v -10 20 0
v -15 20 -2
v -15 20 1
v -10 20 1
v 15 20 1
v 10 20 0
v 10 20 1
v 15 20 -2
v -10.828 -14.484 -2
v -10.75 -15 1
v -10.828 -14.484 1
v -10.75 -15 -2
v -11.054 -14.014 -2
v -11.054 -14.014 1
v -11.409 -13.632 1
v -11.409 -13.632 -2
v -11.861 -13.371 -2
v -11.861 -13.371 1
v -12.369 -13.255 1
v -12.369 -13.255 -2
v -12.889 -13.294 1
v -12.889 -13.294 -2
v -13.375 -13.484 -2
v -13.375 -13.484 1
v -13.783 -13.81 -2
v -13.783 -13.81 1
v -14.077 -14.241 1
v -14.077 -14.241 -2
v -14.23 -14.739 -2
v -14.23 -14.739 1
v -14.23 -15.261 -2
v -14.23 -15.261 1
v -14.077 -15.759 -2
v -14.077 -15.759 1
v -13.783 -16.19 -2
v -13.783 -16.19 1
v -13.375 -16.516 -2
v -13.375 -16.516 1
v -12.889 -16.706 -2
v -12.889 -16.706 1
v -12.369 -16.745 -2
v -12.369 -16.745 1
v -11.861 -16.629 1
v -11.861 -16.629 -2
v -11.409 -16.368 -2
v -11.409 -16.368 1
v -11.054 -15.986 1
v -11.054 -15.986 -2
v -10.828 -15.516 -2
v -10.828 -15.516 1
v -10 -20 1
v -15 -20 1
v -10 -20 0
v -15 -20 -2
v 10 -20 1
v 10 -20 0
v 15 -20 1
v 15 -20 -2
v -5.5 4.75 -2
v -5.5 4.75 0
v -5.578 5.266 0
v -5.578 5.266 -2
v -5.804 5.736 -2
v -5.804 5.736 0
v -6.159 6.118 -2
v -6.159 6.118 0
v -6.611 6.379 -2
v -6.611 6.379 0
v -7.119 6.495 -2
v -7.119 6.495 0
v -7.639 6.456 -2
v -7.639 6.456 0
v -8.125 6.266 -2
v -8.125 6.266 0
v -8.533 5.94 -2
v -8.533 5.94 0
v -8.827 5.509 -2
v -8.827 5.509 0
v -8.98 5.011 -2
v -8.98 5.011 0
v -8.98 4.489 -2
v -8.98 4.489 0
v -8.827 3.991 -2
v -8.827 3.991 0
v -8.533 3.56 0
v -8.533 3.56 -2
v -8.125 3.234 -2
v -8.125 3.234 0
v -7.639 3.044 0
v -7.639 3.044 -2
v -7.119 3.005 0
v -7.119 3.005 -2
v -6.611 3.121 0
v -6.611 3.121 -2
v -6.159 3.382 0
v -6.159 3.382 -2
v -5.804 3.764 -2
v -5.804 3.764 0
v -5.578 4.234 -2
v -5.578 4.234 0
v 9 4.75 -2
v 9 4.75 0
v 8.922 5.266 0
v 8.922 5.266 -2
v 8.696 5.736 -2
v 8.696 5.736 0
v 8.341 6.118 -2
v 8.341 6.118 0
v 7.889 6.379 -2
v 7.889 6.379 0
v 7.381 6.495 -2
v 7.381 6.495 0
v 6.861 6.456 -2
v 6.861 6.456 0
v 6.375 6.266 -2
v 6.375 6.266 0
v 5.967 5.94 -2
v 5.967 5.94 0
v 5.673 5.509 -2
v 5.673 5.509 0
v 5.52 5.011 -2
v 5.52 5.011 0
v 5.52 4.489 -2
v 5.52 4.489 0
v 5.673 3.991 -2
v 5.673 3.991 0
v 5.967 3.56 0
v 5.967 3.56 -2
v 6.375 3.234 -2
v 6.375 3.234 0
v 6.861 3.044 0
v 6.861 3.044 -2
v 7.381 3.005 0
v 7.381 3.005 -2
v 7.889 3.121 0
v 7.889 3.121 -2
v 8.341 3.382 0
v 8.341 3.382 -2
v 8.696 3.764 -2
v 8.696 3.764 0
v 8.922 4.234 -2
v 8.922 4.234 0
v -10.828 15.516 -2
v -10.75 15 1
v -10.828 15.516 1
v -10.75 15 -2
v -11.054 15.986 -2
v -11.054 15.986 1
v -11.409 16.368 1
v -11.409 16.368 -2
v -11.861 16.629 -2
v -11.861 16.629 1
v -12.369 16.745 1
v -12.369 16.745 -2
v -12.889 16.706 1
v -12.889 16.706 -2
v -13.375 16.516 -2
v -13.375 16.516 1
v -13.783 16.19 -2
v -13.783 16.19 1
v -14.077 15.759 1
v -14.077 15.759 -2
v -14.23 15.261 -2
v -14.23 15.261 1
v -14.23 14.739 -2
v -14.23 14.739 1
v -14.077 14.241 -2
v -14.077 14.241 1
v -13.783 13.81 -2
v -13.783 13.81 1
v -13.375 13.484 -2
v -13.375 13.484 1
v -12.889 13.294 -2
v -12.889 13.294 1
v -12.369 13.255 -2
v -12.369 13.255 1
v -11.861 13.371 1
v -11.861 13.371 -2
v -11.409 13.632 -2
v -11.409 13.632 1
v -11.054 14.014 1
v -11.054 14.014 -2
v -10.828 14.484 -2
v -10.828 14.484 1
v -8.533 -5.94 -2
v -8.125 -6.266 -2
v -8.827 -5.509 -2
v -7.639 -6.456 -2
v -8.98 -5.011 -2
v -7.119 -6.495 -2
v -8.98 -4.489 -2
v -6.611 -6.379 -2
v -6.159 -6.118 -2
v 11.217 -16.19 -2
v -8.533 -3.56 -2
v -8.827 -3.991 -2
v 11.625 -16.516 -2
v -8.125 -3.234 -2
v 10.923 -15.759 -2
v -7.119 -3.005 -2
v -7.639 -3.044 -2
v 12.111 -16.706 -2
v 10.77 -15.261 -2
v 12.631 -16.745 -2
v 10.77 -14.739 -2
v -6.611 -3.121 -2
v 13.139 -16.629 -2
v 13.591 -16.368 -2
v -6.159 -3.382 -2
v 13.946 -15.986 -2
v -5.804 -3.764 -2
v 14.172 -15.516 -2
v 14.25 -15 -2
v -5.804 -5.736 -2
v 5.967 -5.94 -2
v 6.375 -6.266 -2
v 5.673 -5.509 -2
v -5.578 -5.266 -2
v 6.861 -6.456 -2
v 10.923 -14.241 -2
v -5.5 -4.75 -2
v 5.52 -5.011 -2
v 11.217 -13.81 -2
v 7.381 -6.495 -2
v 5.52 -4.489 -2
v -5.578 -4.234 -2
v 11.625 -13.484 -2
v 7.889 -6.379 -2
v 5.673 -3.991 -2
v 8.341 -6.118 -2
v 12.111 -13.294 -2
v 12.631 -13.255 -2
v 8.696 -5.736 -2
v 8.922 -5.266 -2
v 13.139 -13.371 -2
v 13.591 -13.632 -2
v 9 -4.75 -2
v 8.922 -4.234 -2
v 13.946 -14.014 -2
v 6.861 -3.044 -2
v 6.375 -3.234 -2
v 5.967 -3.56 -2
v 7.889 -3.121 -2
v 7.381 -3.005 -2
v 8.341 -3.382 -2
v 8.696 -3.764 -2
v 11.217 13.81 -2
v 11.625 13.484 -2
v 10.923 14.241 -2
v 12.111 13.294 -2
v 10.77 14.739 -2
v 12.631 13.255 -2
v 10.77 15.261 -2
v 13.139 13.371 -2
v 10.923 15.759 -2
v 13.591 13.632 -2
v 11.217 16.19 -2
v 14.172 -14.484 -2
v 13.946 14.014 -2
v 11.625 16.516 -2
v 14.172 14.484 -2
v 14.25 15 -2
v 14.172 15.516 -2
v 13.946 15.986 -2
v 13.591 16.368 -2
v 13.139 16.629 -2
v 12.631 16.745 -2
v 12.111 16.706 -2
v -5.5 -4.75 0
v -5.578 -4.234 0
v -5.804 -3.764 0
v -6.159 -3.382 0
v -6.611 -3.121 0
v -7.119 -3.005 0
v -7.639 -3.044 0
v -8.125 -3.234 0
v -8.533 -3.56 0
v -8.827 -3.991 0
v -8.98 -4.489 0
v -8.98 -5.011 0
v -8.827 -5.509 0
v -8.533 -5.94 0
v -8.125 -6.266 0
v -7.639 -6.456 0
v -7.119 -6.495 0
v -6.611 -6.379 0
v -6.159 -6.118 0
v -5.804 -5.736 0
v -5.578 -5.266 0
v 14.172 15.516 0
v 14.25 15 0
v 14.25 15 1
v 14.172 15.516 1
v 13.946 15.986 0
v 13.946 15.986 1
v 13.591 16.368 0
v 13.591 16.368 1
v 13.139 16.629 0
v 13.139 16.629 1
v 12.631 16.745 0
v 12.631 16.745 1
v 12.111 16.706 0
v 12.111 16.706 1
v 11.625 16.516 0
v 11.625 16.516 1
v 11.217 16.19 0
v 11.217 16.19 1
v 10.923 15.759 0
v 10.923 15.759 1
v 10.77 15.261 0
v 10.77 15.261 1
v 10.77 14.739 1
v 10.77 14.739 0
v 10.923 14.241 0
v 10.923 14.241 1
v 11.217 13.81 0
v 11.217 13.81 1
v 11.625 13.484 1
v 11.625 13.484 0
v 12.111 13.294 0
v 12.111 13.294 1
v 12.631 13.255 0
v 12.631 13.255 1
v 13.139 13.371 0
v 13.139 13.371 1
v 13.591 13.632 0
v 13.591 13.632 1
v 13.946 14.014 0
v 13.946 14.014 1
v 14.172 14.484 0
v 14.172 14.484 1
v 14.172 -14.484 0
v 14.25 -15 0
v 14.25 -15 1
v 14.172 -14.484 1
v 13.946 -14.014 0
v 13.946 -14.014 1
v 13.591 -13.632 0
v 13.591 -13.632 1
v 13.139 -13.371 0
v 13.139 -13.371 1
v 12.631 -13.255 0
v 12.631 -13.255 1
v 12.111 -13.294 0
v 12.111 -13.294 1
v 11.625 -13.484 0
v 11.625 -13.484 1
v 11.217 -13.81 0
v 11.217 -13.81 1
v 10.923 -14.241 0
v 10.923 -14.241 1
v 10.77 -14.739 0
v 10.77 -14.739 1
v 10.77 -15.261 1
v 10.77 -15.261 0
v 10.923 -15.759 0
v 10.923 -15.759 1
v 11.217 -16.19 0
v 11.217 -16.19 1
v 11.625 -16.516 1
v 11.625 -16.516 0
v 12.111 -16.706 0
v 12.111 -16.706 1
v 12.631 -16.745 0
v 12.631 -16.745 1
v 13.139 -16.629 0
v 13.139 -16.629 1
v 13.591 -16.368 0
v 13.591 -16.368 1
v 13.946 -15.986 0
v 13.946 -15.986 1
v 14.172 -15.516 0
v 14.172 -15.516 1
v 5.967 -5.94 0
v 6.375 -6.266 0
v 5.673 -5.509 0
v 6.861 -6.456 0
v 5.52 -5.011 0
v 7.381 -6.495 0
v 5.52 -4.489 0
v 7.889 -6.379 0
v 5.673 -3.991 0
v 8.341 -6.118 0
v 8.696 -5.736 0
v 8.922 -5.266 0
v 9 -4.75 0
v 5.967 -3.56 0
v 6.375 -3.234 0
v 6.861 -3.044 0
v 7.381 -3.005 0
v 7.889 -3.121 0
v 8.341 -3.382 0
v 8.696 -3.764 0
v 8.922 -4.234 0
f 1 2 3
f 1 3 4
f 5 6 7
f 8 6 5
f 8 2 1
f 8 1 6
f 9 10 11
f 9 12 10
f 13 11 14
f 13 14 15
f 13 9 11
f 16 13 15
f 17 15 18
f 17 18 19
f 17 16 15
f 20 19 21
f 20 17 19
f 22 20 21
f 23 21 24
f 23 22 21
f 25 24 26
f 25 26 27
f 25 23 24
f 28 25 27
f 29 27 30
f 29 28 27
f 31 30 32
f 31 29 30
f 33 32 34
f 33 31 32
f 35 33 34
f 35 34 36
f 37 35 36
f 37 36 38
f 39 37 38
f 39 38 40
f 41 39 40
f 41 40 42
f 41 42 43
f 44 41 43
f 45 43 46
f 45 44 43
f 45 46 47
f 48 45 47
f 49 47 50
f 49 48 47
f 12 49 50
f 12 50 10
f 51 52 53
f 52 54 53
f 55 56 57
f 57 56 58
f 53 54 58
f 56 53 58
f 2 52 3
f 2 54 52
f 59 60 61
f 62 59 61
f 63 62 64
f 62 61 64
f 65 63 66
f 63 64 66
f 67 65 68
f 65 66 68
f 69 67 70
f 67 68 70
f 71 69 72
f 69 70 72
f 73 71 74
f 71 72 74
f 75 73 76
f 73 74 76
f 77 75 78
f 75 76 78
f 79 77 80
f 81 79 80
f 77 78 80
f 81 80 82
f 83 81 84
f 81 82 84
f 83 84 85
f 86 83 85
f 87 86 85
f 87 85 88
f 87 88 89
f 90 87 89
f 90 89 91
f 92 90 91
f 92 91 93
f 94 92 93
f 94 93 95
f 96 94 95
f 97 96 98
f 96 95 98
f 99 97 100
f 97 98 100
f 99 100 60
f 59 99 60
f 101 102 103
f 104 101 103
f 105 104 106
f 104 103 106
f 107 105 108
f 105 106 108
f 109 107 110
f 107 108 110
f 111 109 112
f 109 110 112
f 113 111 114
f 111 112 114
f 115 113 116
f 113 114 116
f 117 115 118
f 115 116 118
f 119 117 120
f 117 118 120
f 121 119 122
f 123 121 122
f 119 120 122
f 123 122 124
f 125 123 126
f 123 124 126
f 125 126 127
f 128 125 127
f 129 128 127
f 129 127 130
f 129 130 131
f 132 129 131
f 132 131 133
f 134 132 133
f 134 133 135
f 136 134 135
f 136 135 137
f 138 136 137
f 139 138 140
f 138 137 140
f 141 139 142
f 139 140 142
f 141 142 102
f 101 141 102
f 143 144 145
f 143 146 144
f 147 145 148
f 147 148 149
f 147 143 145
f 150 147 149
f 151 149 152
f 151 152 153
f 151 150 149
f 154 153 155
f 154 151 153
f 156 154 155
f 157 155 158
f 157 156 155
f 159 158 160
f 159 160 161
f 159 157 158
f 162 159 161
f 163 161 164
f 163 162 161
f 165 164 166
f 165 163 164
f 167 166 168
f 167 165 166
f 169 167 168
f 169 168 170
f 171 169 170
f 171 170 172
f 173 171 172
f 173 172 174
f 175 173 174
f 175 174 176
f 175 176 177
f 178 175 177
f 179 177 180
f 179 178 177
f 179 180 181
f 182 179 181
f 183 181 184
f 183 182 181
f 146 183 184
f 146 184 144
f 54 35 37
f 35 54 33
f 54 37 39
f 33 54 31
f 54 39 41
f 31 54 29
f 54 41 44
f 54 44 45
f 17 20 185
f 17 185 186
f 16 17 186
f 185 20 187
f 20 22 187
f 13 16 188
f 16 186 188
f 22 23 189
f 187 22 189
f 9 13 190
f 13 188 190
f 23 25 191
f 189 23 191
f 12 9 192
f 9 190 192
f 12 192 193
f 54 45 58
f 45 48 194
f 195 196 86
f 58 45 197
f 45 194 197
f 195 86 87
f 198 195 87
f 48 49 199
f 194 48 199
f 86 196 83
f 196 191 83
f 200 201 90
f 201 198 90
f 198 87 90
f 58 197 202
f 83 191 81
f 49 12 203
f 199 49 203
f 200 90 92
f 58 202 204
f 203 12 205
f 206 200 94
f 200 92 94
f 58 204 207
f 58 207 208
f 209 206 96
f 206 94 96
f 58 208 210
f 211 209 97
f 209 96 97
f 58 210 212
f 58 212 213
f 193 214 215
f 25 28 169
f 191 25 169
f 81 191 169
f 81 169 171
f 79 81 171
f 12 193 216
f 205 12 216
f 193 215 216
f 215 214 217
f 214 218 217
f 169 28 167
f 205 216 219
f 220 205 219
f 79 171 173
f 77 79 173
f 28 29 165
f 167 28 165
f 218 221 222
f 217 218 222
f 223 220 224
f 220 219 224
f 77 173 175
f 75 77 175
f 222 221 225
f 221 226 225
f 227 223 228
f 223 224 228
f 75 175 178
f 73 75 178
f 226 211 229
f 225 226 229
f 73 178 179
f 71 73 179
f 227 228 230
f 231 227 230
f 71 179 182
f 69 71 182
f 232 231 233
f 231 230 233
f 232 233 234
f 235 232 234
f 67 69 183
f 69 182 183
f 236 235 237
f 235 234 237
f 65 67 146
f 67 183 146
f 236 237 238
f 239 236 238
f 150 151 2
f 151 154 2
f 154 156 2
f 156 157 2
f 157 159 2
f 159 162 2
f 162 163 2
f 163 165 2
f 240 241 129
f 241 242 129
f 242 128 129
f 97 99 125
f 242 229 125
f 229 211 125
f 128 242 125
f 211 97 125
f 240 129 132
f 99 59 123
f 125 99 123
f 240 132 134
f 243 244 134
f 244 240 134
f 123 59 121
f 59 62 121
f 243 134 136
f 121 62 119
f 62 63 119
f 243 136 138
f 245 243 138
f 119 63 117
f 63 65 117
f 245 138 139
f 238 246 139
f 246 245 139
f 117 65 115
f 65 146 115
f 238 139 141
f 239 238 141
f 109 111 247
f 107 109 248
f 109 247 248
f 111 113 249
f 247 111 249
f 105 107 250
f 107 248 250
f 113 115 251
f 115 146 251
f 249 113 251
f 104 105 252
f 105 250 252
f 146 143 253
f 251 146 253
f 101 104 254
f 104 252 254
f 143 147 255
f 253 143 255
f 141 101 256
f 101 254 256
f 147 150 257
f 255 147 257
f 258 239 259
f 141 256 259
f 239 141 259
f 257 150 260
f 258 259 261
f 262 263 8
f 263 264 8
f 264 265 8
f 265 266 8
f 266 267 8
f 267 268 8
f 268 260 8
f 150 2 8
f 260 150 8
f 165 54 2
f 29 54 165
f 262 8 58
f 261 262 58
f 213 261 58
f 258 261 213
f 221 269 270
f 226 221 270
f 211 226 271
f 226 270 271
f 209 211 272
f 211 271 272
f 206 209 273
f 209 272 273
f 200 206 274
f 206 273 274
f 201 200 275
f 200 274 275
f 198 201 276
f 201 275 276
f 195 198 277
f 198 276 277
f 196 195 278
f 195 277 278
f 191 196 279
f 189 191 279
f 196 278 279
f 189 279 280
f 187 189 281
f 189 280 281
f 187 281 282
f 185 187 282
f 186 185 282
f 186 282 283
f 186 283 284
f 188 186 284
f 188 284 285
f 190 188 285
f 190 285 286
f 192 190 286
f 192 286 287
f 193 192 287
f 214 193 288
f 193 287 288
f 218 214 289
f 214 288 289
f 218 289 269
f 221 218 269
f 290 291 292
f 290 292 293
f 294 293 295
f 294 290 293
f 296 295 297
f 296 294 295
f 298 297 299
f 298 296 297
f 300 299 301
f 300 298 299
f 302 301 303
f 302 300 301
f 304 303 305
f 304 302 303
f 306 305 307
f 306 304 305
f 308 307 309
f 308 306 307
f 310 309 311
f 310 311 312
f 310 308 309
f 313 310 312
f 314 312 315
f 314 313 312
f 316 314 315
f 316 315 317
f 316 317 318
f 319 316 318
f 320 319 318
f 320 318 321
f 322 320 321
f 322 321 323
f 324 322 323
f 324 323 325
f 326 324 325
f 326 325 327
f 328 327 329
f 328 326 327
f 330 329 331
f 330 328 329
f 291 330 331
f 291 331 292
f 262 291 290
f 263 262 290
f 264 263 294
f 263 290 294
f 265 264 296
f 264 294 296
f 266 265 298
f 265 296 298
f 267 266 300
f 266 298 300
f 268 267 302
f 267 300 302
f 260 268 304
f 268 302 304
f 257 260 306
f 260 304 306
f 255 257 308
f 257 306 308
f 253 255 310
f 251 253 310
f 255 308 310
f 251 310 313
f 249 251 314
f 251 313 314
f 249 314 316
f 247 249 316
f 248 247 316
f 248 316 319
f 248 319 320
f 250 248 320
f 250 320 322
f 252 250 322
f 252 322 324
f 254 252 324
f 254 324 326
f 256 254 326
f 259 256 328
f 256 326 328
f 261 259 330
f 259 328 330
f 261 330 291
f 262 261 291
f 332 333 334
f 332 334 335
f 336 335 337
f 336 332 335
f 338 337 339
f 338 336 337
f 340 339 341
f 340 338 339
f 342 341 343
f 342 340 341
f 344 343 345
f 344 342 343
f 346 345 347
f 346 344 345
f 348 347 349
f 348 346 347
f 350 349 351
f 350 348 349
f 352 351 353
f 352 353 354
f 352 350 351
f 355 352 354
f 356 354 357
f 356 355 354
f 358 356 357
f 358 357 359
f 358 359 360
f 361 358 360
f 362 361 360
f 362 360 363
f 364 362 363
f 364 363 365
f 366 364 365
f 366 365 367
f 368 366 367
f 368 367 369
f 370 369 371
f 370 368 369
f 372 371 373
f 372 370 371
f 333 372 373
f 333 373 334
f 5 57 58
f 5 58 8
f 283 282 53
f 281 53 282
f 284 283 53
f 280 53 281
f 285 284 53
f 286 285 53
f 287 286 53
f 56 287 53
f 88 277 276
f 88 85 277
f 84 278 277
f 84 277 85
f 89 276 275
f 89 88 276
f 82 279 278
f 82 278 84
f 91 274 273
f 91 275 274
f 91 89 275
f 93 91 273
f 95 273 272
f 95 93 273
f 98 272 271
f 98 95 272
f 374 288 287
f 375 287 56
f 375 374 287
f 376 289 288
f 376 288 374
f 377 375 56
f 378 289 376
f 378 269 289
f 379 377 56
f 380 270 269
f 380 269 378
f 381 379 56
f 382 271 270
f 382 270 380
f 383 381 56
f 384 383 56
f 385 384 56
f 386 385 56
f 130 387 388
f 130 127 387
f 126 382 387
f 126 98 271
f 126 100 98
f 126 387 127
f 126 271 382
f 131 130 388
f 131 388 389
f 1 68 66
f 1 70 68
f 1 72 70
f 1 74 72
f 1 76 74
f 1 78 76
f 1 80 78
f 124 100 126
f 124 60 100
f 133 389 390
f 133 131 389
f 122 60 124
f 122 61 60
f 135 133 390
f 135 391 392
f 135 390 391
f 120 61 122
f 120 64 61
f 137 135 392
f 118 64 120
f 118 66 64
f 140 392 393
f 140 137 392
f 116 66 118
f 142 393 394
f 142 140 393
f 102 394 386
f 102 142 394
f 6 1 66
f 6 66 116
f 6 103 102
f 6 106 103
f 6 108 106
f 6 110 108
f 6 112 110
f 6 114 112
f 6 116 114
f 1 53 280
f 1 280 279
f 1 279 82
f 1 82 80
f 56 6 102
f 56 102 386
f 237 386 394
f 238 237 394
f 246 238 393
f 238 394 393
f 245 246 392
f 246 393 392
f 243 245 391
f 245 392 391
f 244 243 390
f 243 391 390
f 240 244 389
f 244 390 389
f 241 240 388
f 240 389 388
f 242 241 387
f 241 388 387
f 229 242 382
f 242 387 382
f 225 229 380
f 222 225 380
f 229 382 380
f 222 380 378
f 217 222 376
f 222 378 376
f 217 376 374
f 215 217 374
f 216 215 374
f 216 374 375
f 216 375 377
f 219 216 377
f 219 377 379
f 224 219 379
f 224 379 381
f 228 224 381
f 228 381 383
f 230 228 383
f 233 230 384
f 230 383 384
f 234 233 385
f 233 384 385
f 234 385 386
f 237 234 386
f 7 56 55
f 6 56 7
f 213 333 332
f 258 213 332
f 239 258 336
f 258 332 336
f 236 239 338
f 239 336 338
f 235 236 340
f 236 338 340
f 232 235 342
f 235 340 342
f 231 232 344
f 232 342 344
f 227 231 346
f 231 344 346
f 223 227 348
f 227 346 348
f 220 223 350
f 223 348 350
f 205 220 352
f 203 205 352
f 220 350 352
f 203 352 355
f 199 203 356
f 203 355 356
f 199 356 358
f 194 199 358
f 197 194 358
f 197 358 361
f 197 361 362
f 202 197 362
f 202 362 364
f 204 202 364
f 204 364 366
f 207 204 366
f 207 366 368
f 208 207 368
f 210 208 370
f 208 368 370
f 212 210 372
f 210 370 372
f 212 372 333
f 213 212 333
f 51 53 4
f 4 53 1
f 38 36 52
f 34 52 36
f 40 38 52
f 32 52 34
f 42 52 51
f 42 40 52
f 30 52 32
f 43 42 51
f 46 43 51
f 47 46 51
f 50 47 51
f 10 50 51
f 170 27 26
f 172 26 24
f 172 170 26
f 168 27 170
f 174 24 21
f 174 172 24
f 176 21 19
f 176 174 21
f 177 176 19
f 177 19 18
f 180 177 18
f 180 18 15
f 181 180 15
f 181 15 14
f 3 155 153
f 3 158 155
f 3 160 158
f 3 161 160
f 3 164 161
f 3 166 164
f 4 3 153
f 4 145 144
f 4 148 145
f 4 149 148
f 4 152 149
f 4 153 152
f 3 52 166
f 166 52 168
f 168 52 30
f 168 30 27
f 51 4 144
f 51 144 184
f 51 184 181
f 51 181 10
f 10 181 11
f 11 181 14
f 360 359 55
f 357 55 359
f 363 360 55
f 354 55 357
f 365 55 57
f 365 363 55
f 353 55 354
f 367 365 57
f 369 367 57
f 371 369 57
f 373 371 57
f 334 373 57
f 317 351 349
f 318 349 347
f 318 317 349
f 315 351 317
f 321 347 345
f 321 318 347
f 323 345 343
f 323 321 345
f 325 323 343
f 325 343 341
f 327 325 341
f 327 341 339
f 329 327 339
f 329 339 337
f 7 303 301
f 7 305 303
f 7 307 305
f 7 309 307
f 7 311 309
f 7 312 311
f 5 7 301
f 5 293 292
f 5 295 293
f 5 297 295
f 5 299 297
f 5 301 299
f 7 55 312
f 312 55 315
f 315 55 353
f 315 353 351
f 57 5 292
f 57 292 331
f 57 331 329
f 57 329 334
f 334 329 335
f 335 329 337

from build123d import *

# Parameters (mm, degrees)
ESQUISSE1_W        = 30
ESQUISSE1_H        = 40
ESQUISSE1_R        = 1.75
BOSS_EXTRU_1_DEPTH = 2
BOSS_EXTRU_2_START = 1
ESQUISSE1_3_W      = 5
ESQUISSE1_3_H      = 40
ESQUISSE1_3_R      = 1.75
BOSS_EXTRU_2_DEPTH = 1


with BuildPart() as part:
    # Esquisse1 → Boss.-Extru.1 (new body)
    with BuildSketch(Plane.XY):
        Rectangle(ESQUISSE1_W, ESQUISSE1_H)
        with Locations((-7.25, -4.75)):
            Circle(ESQUISSE1_R, mode=Mode.SUBTRACT)
        with Locations((7.25, -4.75)):
            Circle(ESQUISSE1_R, mode=Mode.SUBTRACT)
        with Locations((-7.25, 4.75)):
            Circle(ESQUISSE1_R, mode=Mode.SUBTRACT)
        with Locations((7.25, 4.75)):
            Circle(ESQUISSE1_R, mode=Mode.SUBTRACT)
        with Locations((12.5, 15)):
            Circle(ESQUISSE1_R, mode=Mode.SUBTRACT)
        with Locations((12.5, -15)):
            Circle(ESQUISSE1_R, mode=Mode.SUBTRACT)
        with Locations((-12.5, 15)):
            Circle(ESQUISSE1_R, mode=Mode.SUBTRACT)
        with Locations((-12.5, -15)):
            Circle(ESQUISSE1_R, mode=Mode.SUBTRACT)
    extrude(amount=-BOSS_EXTRU_1_DEPTH)

    # Esquisse1<3> → Boss.-Extru.2 (add)
    # profile 1 of 2: a face of its own
    with BuildSketch(Plane.XY.offset(BOSS_EXTRU_2_START)):
        with Locations((-12.5, 0)):
            Rectangle(ESQUISSE1_3_W, ESQUISSE1_3_H)
        with Locations((-12.5, -15)):
            Circle(ESQUISSE1_3_R, mode=Mode.SUBTRACT)
        with Locations((-12.5, 15)):
            Circle(ESQUISSE1_3_R, mode=Mode.SUBTRACT)
    # profile 2 of 2: a face of its own
    with BuildSketch(Plane.XY.offset(BOSS_EXTRU_2_START)):
        with Locations((12.5, 0)):
            Rectangle(ESQUISSE1_3_W, ESQUISSE1_3_H)
        with Locations((12.5, -15)):
            Circle(ESQUISSE1_3_R, mode=Mode.SUBTRACT)
        with Locations((12.5, 15)):
            Circle(ESQUISSE1_3_R, mode=Mode.SUBTRACT)
    extrude(amount=-BOSS_EXTRU_2_DEPTH)


solid = part.part
